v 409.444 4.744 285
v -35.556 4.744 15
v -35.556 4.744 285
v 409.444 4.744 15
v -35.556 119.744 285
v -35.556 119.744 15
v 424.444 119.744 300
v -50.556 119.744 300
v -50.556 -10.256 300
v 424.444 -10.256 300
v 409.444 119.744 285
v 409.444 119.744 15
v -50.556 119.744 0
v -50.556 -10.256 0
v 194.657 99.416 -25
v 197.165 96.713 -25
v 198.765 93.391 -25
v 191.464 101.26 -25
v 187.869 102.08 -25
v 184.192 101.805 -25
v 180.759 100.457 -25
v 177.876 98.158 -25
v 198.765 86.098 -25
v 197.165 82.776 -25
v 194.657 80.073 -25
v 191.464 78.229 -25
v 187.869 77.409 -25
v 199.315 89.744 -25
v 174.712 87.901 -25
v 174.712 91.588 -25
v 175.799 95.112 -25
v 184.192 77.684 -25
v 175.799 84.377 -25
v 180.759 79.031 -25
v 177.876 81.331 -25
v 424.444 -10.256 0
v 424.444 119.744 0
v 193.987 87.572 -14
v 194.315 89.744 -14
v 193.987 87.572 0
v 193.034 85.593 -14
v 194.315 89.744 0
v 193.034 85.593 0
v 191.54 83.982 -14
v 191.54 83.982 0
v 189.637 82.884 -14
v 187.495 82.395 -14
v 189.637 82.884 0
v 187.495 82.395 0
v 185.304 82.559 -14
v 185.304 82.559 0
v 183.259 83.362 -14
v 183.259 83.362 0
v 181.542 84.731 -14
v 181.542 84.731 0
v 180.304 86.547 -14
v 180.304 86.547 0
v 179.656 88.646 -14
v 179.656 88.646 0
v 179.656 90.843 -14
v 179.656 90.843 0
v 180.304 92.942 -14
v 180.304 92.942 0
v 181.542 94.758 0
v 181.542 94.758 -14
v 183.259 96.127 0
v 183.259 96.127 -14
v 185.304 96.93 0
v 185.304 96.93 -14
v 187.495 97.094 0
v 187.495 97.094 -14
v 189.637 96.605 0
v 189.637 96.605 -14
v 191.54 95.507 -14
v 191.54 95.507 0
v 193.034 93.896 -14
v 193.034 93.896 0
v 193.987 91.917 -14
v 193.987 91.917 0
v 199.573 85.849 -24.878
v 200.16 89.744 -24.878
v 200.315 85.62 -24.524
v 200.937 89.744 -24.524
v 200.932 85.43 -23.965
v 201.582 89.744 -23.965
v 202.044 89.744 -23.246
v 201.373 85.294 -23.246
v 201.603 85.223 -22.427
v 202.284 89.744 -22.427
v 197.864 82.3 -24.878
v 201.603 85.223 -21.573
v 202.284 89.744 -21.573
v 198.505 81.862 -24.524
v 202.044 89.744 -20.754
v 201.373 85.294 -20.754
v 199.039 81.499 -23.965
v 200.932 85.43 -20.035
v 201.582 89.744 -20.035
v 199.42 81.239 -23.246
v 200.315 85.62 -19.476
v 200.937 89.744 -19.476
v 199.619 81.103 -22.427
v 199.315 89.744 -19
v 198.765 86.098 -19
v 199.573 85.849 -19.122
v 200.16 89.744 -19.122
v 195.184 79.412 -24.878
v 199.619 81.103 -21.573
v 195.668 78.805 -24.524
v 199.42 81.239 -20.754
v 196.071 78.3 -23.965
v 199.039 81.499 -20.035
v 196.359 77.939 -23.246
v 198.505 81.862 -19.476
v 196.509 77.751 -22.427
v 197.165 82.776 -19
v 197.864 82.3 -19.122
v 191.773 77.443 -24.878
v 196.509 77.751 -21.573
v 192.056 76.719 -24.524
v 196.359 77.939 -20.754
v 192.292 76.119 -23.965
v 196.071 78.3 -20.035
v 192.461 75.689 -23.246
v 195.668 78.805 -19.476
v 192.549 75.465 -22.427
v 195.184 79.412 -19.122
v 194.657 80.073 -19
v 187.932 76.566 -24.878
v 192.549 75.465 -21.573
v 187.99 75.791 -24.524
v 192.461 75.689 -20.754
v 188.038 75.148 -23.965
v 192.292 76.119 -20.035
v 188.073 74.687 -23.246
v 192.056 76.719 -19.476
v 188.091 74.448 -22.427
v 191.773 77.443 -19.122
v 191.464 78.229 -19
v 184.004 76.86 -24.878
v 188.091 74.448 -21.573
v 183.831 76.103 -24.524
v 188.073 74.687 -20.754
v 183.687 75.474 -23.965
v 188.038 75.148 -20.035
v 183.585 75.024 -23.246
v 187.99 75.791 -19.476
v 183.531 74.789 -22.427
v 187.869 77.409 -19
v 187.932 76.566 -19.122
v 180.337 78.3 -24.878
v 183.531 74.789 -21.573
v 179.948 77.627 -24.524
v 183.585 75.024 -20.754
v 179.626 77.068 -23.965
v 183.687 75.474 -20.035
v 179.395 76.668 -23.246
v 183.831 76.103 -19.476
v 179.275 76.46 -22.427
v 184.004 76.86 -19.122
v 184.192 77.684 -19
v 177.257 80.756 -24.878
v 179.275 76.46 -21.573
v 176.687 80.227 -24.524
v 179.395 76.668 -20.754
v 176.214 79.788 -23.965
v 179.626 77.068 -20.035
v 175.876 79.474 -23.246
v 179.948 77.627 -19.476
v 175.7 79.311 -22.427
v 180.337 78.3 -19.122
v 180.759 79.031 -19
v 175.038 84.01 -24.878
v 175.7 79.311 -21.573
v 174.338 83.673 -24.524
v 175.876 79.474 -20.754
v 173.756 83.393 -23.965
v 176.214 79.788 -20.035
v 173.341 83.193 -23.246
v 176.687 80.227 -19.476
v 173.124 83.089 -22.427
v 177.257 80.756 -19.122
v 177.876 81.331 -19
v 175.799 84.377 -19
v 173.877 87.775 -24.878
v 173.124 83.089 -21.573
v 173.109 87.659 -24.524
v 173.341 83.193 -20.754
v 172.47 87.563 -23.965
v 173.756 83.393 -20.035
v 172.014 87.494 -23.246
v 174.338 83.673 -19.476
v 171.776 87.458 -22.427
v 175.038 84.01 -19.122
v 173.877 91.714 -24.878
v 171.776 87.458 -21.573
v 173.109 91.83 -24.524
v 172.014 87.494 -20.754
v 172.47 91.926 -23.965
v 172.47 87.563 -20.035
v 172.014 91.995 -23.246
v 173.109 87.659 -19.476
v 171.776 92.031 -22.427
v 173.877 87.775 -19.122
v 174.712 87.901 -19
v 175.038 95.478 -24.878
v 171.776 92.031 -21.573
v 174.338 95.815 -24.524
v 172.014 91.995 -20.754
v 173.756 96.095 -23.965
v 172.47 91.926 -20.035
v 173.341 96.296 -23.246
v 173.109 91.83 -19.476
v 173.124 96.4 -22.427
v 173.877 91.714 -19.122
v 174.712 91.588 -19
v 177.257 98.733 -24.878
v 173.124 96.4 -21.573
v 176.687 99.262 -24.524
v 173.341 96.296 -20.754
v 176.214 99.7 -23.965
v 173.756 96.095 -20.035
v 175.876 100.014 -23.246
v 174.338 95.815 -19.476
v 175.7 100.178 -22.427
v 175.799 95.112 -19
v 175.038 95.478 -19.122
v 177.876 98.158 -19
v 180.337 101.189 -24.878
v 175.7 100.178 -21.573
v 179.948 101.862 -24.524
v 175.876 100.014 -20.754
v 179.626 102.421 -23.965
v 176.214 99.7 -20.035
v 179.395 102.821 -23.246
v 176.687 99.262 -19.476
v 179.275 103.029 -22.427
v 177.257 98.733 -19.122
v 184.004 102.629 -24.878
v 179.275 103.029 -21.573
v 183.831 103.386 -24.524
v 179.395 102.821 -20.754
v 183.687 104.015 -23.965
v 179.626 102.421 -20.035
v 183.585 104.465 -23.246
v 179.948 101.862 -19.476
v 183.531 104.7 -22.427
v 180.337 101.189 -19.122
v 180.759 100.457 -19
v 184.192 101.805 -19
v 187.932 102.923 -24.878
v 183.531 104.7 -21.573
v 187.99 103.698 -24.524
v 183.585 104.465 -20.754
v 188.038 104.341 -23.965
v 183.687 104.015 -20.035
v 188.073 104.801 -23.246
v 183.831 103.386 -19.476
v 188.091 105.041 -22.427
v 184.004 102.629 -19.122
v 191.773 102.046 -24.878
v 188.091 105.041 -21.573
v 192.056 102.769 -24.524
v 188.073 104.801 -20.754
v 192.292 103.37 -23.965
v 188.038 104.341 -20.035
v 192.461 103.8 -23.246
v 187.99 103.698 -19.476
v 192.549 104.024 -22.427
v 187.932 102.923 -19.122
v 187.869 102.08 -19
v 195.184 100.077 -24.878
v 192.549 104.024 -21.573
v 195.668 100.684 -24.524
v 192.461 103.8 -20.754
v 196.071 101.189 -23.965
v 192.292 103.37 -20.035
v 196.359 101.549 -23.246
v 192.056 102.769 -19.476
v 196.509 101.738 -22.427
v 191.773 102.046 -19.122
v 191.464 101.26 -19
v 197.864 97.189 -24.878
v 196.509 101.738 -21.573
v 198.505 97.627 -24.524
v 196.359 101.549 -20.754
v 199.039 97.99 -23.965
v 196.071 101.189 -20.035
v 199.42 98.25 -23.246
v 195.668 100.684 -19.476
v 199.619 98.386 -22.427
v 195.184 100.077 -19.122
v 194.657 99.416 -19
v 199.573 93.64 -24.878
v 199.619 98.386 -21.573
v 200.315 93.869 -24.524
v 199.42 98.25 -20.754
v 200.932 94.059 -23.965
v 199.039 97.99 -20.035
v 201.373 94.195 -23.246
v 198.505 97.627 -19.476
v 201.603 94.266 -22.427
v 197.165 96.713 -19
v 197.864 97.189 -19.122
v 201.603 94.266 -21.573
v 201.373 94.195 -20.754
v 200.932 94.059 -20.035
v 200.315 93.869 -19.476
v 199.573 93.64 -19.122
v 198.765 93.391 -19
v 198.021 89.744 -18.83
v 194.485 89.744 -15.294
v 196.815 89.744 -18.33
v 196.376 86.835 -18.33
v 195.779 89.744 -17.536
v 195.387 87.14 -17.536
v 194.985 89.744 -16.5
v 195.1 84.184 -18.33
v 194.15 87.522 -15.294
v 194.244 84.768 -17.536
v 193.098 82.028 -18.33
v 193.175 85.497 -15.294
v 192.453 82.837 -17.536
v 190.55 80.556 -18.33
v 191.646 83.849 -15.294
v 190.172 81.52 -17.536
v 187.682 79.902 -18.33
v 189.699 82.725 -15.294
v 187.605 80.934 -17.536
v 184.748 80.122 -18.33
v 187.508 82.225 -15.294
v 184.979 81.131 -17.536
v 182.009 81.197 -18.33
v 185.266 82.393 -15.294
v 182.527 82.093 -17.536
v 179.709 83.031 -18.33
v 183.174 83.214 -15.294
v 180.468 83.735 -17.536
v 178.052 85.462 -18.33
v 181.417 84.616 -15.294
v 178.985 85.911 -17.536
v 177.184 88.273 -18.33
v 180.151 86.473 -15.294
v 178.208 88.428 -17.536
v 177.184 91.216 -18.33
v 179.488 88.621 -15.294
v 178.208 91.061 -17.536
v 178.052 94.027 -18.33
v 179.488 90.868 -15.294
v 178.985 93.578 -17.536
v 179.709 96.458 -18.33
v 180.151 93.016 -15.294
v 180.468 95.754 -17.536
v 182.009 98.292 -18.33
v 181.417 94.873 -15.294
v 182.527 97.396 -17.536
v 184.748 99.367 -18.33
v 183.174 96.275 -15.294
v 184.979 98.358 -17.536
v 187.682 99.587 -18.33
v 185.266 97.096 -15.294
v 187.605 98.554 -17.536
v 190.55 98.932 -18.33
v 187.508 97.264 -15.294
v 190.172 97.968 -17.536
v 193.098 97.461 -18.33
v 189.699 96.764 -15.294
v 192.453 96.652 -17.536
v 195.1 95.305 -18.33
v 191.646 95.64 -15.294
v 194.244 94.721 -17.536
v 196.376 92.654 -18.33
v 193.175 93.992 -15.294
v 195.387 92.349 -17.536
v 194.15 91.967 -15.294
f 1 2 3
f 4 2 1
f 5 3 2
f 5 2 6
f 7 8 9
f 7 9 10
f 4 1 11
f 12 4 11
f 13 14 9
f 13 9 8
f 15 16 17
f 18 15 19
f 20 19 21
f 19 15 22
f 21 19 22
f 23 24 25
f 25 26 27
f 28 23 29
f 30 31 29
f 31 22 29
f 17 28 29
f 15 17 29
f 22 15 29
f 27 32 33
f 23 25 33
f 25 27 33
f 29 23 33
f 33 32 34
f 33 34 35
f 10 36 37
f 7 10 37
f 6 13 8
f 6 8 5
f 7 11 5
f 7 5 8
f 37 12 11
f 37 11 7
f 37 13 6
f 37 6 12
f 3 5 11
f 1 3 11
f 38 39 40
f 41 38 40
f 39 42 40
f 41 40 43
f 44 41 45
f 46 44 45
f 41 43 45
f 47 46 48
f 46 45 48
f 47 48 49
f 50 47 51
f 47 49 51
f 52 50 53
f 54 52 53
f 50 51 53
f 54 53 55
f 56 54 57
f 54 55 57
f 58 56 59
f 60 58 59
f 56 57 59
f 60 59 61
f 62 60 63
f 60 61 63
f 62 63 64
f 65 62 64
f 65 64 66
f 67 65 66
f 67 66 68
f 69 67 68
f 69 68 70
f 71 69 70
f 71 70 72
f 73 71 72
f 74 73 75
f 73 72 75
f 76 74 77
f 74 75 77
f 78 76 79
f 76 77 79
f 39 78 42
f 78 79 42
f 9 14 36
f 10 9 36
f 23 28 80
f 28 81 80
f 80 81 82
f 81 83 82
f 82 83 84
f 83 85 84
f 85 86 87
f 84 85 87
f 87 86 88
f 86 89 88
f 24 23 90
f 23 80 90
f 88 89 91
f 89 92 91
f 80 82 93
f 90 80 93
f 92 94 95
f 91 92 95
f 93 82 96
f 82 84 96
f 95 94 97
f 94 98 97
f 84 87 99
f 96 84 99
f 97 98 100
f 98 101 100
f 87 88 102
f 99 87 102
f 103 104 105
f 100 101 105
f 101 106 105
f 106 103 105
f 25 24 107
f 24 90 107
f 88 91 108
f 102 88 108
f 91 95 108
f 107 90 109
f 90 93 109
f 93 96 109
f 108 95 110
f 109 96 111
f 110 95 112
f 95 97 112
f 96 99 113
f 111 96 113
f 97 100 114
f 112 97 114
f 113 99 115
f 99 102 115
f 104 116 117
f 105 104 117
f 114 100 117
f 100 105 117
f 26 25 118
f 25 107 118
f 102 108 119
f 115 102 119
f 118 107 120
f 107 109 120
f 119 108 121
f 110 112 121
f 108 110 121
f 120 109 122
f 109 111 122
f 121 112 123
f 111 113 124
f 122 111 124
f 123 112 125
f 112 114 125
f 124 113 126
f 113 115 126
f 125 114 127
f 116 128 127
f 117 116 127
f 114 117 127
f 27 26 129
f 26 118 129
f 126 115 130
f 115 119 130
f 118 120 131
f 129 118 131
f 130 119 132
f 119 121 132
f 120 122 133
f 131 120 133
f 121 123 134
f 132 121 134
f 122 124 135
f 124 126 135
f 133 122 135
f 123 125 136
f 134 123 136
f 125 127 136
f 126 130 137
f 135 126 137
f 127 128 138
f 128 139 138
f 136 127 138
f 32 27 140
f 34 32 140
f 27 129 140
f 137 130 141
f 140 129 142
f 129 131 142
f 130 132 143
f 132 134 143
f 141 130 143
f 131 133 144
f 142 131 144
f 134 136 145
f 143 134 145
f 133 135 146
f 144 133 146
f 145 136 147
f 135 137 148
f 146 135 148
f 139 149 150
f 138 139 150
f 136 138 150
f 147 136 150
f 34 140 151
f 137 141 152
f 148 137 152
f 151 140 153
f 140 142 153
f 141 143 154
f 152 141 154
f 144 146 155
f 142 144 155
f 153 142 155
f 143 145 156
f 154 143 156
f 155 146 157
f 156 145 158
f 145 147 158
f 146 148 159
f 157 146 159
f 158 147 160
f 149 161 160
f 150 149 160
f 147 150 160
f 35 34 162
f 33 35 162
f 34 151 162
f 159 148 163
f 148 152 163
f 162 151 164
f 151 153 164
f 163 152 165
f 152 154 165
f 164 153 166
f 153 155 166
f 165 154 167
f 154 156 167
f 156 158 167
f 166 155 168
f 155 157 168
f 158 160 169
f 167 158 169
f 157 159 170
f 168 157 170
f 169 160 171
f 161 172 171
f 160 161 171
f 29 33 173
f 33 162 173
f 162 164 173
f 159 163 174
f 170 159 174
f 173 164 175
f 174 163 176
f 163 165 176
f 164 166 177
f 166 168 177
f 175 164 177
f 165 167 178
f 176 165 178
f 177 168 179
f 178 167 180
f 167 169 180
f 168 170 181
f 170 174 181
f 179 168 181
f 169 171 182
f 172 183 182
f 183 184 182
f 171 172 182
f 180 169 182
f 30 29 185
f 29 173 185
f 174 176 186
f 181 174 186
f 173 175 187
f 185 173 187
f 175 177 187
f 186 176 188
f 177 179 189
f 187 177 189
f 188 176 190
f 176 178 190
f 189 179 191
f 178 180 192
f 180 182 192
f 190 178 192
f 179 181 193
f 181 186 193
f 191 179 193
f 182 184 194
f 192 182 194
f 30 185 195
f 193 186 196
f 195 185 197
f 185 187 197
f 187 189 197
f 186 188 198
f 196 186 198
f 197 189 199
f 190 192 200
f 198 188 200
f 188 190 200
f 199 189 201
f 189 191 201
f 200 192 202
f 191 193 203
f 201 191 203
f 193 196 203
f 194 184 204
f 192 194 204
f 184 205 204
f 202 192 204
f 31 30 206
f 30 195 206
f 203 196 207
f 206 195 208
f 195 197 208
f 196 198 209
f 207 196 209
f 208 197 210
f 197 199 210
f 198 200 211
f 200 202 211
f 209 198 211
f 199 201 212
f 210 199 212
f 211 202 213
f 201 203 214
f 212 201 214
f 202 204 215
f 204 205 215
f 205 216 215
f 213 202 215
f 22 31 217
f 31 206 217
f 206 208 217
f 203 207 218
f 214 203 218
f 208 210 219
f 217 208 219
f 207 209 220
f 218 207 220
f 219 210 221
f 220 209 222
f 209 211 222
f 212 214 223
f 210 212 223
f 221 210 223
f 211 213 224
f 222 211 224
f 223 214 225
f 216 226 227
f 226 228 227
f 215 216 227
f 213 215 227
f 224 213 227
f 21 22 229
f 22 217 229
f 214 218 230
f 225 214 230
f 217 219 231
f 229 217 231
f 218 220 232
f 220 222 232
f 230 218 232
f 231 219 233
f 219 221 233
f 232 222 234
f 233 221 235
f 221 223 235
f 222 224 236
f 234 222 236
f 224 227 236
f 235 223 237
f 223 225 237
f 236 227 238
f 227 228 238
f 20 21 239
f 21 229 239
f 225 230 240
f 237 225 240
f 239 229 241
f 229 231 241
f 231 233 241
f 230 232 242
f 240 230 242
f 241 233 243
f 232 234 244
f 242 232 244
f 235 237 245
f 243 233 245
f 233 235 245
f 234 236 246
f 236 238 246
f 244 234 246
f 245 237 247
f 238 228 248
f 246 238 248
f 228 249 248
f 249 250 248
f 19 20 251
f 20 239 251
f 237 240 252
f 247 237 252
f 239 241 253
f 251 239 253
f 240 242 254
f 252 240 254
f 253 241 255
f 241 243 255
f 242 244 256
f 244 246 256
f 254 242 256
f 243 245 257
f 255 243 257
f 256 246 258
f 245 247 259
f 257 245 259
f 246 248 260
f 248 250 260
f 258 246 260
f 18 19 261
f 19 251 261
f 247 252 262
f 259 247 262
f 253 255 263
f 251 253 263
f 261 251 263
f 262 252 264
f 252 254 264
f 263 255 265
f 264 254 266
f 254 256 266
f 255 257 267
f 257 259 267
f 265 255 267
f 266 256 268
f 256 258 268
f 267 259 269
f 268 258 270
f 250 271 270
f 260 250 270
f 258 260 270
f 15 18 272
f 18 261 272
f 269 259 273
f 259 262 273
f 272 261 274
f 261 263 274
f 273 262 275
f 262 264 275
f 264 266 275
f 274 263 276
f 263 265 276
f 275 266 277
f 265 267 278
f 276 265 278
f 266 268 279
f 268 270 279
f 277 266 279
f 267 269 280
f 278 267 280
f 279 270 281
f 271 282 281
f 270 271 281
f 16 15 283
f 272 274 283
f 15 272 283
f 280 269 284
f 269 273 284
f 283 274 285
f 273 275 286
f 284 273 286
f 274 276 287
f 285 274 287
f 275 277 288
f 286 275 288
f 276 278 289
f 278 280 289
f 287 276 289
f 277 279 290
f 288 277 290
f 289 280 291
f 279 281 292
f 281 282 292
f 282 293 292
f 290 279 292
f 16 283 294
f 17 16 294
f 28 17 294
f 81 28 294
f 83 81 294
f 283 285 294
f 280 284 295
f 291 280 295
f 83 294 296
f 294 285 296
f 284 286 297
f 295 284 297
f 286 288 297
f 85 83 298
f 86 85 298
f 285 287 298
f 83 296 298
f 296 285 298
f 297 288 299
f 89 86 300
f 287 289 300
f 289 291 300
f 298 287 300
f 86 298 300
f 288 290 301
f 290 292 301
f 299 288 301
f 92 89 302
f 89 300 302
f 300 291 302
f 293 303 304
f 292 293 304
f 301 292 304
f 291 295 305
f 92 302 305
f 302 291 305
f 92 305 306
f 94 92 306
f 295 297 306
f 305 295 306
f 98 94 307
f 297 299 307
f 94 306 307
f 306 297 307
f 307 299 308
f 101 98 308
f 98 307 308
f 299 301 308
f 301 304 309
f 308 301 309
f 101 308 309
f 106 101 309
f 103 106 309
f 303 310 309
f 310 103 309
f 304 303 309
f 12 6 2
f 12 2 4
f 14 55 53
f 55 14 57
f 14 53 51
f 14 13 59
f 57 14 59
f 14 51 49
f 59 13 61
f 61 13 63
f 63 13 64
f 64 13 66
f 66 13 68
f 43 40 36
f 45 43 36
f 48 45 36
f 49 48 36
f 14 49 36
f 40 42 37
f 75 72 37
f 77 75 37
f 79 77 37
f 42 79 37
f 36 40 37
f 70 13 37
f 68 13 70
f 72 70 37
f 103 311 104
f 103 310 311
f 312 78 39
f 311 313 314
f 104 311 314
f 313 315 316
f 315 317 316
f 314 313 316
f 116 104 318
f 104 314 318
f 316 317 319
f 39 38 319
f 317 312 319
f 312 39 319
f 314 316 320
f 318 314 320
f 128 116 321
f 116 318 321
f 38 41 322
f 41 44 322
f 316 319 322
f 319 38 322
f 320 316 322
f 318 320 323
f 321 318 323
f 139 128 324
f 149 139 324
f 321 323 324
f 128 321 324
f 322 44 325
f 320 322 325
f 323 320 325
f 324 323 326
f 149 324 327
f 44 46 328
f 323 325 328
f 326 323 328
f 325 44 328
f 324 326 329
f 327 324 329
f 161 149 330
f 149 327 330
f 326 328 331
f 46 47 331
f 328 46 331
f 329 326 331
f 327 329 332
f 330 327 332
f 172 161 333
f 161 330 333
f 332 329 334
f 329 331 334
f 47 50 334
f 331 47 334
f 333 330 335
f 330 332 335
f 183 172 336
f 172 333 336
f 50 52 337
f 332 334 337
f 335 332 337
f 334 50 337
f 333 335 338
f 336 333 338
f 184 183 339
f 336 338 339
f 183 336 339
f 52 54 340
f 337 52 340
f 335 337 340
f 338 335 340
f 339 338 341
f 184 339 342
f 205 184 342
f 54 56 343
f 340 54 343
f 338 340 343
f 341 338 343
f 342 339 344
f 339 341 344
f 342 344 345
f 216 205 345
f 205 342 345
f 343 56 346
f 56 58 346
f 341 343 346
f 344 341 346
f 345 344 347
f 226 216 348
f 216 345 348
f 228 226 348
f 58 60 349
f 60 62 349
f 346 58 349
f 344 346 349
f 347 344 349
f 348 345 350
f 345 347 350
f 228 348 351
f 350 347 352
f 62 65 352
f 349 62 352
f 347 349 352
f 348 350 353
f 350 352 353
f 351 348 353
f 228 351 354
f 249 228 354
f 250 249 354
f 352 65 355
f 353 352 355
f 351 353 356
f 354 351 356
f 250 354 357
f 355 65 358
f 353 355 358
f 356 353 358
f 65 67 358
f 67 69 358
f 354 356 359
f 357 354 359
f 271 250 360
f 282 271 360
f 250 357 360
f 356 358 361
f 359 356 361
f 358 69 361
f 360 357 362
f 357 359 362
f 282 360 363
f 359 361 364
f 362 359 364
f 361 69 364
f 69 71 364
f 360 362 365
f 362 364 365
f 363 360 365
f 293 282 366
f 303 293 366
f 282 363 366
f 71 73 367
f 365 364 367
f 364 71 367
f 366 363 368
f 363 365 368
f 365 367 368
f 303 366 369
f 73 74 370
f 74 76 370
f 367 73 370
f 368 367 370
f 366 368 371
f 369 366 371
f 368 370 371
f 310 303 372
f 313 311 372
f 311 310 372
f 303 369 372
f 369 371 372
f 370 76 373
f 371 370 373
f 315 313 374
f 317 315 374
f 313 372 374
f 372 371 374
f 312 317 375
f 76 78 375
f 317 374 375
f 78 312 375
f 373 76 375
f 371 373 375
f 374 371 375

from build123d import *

# Parameters (mm, degrees)
SKETCH1_W           = 475
SKETCH1_H           = 130
BOSS_EXTRUDE1_DEPTH = 300
SHELL1_T            = -15


with BuildPart() as part:
    # Sketch1 → Boss-Extrude1 (new body)
    with BuildSketch(Plane.XY):
        with Locations((186.944444444, 54.744444444)):
            Rectangle(SKETCH1_W, SKETCH1_H)
    extrude(amount=BOSS_EXTRUDE1_DEPTH)

    # Shell1
    shell1_openings = [part.faces().sort_by_distance(p)[0] for p in [
        (186.944444444, 119.744444444, 150),
    ]]
    offset(amount=SHELL1_T, openings=shell1_openings, kind=Kind.INTERSECTION)

    # Sketch3 → Revolve2 (revolve)
    with BuildSketch(Plane.ZY.offset(-186.944444444), mode=Mode.PRIVATE) as revolve2_sk:
        with BuildLine():
            Line((0, 89.744444444), (-25, 89.744444444))
            Line((-25, 89.744444444), (-25, 102.114714247))
            ThreePointArc((-25, 102.114714247), (-22, 105.114714247), (-19, 102.114714247))
            ThreePointArc((-19, 102.114714247), (-17.535533906, 98.579180341), (-14, 97.114714247))
            Line((-14, 97.114714247), (0, 97.114714247))
            Line((0, 97.114714247), (0, 89.744444444))
        make_face()
    revolve(revolve2_sk.sketch.rotate(Axis((186.944444444, 89.744444444, 0), (0, 0, -1)), 90), axis=Axis((186.944444444, 89.744444444, 0), (0, 0, -1)))


solid = part.part
